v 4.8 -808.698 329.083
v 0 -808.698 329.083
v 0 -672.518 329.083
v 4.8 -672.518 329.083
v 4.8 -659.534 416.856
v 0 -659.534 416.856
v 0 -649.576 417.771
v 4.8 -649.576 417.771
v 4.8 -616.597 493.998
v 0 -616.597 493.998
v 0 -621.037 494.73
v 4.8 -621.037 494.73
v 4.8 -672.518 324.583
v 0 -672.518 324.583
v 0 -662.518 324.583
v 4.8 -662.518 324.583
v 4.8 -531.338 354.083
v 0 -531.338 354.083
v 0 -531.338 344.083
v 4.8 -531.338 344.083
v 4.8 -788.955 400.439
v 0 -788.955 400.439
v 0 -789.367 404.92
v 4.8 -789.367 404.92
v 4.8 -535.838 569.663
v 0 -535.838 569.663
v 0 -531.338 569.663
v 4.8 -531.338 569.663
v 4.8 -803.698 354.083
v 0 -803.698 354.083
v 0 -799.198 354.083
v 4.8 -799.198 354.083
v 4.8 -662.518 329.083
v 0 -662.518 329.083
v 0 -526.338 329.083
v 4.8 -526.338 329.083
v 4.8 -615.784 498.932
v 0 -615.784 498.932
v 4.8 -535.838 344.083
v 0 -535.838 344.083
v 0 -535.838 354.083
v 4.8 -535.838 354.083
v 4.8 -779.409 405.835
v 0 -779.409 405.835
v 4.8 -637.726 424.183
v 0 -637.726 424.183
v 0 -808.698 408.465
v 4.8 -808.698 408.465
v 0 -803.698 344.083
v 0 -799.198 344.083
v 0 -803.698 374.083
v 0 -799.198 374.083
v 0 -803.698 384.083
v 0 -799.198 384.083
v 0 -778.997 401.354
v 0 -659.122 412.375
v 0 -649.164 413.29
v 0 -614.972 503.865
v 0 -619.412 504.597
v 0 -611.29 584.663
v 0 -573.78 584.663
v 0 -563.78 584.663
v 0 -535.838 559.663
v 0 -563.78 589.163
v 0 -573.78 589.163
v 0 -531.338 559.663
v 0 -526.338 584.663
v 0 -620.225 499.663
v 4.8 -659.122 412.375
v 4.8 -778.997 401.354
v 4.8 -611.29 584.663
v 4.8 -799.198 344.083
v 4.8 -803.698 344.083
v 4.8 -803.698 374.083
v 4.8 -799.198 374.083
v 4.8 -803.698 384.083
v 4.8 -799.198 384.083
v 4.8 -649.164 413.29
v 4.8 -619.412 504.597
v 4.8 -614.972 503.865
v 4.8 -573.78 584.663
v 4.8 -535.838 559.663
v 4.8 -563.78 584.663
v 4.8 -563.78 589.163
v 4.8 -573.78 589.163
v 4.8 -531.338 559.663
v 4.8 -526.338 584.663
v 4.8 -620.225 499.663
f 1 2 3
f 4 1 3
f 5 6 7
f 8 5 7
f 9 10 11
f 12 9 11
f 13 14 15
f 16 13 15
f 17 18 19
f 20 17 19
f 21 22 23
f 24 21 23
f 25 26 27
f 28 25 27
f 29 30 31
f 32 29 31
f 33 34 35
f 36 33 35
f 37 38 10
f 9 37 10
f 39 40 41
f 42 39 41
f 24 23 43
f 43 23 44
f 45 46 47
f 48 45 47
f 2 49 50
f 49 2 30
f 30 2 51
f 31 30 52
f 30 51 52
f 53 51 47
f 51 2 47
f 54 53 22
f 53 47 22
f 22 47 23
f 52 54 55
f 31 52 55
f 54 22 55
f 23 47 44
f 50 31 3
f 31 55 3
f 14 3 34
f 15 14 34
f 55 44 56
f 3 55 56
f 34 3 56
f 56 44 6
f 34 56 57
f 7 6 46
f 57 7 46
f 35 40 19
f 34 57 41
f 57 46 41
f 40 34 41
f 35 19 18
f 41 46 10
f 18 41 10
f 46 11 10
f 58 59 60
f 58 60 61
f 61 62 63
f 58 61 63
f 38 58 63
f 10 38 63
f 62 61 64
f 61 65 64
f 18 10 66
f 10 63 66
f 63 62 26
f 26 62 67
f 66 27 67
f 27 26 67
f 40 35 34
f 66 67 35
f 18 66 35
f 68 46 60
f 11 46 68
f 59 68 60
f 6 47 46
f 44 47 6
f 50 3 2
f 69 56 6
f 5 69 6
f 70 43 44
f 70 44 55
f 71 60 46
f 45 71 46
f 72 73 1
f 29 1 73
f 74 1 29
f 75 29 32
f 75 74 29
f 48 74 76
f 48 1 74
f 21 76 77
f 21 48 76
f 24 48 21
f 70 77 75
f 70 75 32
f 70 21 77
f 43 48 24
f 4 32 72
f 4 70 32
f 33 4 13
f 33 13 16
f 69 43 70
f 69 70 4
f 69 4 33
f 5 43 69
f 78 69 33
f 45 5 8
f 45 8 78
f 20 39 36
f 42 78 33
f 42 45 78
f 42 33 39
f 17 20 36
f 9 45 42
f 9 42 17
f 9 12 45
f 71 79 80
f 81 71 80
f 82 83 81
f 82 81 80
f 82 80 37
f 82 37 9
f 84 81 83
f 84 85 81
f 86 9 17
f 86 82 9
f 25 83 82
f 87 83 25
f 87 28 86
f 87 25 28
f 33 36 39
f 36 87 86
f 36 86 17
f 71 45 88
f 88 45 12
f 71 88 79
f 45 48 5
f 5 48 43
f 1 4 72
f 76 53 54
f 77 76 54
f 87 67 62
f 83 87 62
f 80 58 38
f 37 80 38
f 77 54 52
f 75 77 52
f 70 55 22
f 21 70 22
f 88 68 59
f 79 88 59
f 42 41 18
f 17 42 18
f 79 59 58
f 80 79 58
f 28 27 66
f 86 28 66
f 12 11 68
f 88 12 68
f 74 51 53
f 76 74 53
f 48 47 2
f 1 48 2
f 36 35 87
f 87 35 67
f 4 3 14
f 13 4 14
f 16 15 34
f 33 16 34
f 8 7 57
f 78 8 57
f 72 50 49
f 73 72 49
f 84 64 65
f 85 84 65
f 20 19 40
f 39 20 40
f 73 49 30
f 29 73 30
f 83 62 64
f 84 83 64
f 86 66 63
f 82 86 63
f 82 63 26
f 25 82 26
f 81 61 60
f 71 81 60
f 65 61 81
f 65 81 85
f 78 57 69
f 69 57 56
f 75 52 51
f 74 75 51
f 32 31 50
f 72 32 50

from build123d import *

# Parameters (mm, degrees)
F0_W     = 5
F0_H     = 4.5
F1_DEPTH = 4.8


# Not quite as in the source:
# - a feature names something its author has since deleted; it is built from what else it names


with BuildPart() as f1:
    # F0 (on Right) → F1 (new body)
    with BuildSketch(Plane.YZ):
        Polygon((-531.3379881175, 344.0831357297), (-531.3379881175, 329.0831357297), (-526.3379881175, 329.0831357297), (-526.3379881175, 584.6633606824), (-531.3379881175, 584.6633606824), (-531.3379881175, 569.6633606824), (-531.3379881175, 559.6633606824), (-531.3379881175, 354.0831357297), align=None)
        Polygon((-611.2895517261, 584.6633606824), (-637.7260949769, 424.1829931527), (-639.3722244459, 414.1903303575), (-634.2269114077, 414.6633606824), (-621.0372525622, 494.7298534546), (-620.224537093, 499.6633606824), (-619.4118216237, 504.5968679101), (-606.2221627782, 584.6633606824), align=None)
        Polygon((-803.6983604223, 344.0831357297), (-803.6983604223, 329.0831357297), (-672.5181742699, 329.0831357297), (-672.5181742699, 324.5831357297), (-662.5181742699, 324.5831357297), (-662.5181742699, 329.0831357297), (-531.3379881175, 329.0831357297), (-531.3379881175, 344.0831357297), (-535.8379881175, 344.0831357297), (-535.8379881175, 354.0831357297), (-531.3379881175, 354.0831357297), (-531.3379881175, 559.6633606824), (-535.8379881175, 559.6633606824), (-535.8379881175, 569.6633606824), (-531.3379881175, 569.6633606824), (-531.3379881175, 584.6633606824), (-563.7800754478, 584.6633606824), (-568.7800754478, 584.6633606824), (-573.7800754478, 584.6633606824), (-606.2221627782, 584.6633606824), (-619.4118216237, 504.5968679101), (-614.9716651188, 503.8654239878), (-615.784380588, 498.93191676), (-616.5970960573, 493.9984095323), (-621.0372525622, 494.7298534546), (-634.2269114077, 414.6633606824), (-639.3722244459, 414.1903303575), (-649.1639211663, 413.2901383873), (-659.1219276721, 412.3746568573), (-778.9973858727, 401.3540004817), (-788.9553923784, 400.4385189517), (-803.6983604223, 399.0831357297), (-803.6983604223, 384.0831357297), (-799.1983604223, 384.0831357297), (-799.1983604223, 374.0831357297), (-803.6983604223, 374.0831357297), (-803.6983604223, 354.0831357297), (-799.1983604223, 354.0831357297), (-799.1983604223, 344.0831357297), align=None)
        Polygon((-808.6983604223, 329.0831357297), (-803.6983604223, 329.0831357297), (-803.6983604223, 344.0831357297), (-803.6983604223, 354.0831357297), (-803.6983604223, 374.0831357297), (-803.6983604223, 384.0831357297), (-803.6983604223, 399.0831357297), (-808.6983604223, 399.0831357297), (-808.6983604223, 374.0831357297), (-808.6983604223, 354.0831357297), align=None)
        Polygon((-808.6983604223, 403.4437065252), (-808.6983604223, 399.0831357297), (-803.6983604223, 399.0831357297), (-788.9553923784, 400.4385189517), (-789.3673590669, 404.9196218792), (-779.4093525612, 405.8351034093), (-778.9973858727, 401.3540004817), (-659.1219276721, 412.3746568573), (-659.5338943606, 416.8557597849), (-649.5758878549, 417.7712413149), (-649.1639211663, 413.2901383873), (-639.3722244459, 414.1903303575), (-637.7260949769, 424.1829931527), (-650.0610930658, 423.0489847629), (-808.6983604223, 408.4647918168), align=None)
        with Locations((-566.2800754478, 586.9133606824)):
            Rectangle(F0_W, F0_H)
        with Locations((-571.2800754478, 586.9133606824)):
            Rectangle(F0_W, F0_H)
    extrude(amount=F1_DEPTH)


solid = f1.part
